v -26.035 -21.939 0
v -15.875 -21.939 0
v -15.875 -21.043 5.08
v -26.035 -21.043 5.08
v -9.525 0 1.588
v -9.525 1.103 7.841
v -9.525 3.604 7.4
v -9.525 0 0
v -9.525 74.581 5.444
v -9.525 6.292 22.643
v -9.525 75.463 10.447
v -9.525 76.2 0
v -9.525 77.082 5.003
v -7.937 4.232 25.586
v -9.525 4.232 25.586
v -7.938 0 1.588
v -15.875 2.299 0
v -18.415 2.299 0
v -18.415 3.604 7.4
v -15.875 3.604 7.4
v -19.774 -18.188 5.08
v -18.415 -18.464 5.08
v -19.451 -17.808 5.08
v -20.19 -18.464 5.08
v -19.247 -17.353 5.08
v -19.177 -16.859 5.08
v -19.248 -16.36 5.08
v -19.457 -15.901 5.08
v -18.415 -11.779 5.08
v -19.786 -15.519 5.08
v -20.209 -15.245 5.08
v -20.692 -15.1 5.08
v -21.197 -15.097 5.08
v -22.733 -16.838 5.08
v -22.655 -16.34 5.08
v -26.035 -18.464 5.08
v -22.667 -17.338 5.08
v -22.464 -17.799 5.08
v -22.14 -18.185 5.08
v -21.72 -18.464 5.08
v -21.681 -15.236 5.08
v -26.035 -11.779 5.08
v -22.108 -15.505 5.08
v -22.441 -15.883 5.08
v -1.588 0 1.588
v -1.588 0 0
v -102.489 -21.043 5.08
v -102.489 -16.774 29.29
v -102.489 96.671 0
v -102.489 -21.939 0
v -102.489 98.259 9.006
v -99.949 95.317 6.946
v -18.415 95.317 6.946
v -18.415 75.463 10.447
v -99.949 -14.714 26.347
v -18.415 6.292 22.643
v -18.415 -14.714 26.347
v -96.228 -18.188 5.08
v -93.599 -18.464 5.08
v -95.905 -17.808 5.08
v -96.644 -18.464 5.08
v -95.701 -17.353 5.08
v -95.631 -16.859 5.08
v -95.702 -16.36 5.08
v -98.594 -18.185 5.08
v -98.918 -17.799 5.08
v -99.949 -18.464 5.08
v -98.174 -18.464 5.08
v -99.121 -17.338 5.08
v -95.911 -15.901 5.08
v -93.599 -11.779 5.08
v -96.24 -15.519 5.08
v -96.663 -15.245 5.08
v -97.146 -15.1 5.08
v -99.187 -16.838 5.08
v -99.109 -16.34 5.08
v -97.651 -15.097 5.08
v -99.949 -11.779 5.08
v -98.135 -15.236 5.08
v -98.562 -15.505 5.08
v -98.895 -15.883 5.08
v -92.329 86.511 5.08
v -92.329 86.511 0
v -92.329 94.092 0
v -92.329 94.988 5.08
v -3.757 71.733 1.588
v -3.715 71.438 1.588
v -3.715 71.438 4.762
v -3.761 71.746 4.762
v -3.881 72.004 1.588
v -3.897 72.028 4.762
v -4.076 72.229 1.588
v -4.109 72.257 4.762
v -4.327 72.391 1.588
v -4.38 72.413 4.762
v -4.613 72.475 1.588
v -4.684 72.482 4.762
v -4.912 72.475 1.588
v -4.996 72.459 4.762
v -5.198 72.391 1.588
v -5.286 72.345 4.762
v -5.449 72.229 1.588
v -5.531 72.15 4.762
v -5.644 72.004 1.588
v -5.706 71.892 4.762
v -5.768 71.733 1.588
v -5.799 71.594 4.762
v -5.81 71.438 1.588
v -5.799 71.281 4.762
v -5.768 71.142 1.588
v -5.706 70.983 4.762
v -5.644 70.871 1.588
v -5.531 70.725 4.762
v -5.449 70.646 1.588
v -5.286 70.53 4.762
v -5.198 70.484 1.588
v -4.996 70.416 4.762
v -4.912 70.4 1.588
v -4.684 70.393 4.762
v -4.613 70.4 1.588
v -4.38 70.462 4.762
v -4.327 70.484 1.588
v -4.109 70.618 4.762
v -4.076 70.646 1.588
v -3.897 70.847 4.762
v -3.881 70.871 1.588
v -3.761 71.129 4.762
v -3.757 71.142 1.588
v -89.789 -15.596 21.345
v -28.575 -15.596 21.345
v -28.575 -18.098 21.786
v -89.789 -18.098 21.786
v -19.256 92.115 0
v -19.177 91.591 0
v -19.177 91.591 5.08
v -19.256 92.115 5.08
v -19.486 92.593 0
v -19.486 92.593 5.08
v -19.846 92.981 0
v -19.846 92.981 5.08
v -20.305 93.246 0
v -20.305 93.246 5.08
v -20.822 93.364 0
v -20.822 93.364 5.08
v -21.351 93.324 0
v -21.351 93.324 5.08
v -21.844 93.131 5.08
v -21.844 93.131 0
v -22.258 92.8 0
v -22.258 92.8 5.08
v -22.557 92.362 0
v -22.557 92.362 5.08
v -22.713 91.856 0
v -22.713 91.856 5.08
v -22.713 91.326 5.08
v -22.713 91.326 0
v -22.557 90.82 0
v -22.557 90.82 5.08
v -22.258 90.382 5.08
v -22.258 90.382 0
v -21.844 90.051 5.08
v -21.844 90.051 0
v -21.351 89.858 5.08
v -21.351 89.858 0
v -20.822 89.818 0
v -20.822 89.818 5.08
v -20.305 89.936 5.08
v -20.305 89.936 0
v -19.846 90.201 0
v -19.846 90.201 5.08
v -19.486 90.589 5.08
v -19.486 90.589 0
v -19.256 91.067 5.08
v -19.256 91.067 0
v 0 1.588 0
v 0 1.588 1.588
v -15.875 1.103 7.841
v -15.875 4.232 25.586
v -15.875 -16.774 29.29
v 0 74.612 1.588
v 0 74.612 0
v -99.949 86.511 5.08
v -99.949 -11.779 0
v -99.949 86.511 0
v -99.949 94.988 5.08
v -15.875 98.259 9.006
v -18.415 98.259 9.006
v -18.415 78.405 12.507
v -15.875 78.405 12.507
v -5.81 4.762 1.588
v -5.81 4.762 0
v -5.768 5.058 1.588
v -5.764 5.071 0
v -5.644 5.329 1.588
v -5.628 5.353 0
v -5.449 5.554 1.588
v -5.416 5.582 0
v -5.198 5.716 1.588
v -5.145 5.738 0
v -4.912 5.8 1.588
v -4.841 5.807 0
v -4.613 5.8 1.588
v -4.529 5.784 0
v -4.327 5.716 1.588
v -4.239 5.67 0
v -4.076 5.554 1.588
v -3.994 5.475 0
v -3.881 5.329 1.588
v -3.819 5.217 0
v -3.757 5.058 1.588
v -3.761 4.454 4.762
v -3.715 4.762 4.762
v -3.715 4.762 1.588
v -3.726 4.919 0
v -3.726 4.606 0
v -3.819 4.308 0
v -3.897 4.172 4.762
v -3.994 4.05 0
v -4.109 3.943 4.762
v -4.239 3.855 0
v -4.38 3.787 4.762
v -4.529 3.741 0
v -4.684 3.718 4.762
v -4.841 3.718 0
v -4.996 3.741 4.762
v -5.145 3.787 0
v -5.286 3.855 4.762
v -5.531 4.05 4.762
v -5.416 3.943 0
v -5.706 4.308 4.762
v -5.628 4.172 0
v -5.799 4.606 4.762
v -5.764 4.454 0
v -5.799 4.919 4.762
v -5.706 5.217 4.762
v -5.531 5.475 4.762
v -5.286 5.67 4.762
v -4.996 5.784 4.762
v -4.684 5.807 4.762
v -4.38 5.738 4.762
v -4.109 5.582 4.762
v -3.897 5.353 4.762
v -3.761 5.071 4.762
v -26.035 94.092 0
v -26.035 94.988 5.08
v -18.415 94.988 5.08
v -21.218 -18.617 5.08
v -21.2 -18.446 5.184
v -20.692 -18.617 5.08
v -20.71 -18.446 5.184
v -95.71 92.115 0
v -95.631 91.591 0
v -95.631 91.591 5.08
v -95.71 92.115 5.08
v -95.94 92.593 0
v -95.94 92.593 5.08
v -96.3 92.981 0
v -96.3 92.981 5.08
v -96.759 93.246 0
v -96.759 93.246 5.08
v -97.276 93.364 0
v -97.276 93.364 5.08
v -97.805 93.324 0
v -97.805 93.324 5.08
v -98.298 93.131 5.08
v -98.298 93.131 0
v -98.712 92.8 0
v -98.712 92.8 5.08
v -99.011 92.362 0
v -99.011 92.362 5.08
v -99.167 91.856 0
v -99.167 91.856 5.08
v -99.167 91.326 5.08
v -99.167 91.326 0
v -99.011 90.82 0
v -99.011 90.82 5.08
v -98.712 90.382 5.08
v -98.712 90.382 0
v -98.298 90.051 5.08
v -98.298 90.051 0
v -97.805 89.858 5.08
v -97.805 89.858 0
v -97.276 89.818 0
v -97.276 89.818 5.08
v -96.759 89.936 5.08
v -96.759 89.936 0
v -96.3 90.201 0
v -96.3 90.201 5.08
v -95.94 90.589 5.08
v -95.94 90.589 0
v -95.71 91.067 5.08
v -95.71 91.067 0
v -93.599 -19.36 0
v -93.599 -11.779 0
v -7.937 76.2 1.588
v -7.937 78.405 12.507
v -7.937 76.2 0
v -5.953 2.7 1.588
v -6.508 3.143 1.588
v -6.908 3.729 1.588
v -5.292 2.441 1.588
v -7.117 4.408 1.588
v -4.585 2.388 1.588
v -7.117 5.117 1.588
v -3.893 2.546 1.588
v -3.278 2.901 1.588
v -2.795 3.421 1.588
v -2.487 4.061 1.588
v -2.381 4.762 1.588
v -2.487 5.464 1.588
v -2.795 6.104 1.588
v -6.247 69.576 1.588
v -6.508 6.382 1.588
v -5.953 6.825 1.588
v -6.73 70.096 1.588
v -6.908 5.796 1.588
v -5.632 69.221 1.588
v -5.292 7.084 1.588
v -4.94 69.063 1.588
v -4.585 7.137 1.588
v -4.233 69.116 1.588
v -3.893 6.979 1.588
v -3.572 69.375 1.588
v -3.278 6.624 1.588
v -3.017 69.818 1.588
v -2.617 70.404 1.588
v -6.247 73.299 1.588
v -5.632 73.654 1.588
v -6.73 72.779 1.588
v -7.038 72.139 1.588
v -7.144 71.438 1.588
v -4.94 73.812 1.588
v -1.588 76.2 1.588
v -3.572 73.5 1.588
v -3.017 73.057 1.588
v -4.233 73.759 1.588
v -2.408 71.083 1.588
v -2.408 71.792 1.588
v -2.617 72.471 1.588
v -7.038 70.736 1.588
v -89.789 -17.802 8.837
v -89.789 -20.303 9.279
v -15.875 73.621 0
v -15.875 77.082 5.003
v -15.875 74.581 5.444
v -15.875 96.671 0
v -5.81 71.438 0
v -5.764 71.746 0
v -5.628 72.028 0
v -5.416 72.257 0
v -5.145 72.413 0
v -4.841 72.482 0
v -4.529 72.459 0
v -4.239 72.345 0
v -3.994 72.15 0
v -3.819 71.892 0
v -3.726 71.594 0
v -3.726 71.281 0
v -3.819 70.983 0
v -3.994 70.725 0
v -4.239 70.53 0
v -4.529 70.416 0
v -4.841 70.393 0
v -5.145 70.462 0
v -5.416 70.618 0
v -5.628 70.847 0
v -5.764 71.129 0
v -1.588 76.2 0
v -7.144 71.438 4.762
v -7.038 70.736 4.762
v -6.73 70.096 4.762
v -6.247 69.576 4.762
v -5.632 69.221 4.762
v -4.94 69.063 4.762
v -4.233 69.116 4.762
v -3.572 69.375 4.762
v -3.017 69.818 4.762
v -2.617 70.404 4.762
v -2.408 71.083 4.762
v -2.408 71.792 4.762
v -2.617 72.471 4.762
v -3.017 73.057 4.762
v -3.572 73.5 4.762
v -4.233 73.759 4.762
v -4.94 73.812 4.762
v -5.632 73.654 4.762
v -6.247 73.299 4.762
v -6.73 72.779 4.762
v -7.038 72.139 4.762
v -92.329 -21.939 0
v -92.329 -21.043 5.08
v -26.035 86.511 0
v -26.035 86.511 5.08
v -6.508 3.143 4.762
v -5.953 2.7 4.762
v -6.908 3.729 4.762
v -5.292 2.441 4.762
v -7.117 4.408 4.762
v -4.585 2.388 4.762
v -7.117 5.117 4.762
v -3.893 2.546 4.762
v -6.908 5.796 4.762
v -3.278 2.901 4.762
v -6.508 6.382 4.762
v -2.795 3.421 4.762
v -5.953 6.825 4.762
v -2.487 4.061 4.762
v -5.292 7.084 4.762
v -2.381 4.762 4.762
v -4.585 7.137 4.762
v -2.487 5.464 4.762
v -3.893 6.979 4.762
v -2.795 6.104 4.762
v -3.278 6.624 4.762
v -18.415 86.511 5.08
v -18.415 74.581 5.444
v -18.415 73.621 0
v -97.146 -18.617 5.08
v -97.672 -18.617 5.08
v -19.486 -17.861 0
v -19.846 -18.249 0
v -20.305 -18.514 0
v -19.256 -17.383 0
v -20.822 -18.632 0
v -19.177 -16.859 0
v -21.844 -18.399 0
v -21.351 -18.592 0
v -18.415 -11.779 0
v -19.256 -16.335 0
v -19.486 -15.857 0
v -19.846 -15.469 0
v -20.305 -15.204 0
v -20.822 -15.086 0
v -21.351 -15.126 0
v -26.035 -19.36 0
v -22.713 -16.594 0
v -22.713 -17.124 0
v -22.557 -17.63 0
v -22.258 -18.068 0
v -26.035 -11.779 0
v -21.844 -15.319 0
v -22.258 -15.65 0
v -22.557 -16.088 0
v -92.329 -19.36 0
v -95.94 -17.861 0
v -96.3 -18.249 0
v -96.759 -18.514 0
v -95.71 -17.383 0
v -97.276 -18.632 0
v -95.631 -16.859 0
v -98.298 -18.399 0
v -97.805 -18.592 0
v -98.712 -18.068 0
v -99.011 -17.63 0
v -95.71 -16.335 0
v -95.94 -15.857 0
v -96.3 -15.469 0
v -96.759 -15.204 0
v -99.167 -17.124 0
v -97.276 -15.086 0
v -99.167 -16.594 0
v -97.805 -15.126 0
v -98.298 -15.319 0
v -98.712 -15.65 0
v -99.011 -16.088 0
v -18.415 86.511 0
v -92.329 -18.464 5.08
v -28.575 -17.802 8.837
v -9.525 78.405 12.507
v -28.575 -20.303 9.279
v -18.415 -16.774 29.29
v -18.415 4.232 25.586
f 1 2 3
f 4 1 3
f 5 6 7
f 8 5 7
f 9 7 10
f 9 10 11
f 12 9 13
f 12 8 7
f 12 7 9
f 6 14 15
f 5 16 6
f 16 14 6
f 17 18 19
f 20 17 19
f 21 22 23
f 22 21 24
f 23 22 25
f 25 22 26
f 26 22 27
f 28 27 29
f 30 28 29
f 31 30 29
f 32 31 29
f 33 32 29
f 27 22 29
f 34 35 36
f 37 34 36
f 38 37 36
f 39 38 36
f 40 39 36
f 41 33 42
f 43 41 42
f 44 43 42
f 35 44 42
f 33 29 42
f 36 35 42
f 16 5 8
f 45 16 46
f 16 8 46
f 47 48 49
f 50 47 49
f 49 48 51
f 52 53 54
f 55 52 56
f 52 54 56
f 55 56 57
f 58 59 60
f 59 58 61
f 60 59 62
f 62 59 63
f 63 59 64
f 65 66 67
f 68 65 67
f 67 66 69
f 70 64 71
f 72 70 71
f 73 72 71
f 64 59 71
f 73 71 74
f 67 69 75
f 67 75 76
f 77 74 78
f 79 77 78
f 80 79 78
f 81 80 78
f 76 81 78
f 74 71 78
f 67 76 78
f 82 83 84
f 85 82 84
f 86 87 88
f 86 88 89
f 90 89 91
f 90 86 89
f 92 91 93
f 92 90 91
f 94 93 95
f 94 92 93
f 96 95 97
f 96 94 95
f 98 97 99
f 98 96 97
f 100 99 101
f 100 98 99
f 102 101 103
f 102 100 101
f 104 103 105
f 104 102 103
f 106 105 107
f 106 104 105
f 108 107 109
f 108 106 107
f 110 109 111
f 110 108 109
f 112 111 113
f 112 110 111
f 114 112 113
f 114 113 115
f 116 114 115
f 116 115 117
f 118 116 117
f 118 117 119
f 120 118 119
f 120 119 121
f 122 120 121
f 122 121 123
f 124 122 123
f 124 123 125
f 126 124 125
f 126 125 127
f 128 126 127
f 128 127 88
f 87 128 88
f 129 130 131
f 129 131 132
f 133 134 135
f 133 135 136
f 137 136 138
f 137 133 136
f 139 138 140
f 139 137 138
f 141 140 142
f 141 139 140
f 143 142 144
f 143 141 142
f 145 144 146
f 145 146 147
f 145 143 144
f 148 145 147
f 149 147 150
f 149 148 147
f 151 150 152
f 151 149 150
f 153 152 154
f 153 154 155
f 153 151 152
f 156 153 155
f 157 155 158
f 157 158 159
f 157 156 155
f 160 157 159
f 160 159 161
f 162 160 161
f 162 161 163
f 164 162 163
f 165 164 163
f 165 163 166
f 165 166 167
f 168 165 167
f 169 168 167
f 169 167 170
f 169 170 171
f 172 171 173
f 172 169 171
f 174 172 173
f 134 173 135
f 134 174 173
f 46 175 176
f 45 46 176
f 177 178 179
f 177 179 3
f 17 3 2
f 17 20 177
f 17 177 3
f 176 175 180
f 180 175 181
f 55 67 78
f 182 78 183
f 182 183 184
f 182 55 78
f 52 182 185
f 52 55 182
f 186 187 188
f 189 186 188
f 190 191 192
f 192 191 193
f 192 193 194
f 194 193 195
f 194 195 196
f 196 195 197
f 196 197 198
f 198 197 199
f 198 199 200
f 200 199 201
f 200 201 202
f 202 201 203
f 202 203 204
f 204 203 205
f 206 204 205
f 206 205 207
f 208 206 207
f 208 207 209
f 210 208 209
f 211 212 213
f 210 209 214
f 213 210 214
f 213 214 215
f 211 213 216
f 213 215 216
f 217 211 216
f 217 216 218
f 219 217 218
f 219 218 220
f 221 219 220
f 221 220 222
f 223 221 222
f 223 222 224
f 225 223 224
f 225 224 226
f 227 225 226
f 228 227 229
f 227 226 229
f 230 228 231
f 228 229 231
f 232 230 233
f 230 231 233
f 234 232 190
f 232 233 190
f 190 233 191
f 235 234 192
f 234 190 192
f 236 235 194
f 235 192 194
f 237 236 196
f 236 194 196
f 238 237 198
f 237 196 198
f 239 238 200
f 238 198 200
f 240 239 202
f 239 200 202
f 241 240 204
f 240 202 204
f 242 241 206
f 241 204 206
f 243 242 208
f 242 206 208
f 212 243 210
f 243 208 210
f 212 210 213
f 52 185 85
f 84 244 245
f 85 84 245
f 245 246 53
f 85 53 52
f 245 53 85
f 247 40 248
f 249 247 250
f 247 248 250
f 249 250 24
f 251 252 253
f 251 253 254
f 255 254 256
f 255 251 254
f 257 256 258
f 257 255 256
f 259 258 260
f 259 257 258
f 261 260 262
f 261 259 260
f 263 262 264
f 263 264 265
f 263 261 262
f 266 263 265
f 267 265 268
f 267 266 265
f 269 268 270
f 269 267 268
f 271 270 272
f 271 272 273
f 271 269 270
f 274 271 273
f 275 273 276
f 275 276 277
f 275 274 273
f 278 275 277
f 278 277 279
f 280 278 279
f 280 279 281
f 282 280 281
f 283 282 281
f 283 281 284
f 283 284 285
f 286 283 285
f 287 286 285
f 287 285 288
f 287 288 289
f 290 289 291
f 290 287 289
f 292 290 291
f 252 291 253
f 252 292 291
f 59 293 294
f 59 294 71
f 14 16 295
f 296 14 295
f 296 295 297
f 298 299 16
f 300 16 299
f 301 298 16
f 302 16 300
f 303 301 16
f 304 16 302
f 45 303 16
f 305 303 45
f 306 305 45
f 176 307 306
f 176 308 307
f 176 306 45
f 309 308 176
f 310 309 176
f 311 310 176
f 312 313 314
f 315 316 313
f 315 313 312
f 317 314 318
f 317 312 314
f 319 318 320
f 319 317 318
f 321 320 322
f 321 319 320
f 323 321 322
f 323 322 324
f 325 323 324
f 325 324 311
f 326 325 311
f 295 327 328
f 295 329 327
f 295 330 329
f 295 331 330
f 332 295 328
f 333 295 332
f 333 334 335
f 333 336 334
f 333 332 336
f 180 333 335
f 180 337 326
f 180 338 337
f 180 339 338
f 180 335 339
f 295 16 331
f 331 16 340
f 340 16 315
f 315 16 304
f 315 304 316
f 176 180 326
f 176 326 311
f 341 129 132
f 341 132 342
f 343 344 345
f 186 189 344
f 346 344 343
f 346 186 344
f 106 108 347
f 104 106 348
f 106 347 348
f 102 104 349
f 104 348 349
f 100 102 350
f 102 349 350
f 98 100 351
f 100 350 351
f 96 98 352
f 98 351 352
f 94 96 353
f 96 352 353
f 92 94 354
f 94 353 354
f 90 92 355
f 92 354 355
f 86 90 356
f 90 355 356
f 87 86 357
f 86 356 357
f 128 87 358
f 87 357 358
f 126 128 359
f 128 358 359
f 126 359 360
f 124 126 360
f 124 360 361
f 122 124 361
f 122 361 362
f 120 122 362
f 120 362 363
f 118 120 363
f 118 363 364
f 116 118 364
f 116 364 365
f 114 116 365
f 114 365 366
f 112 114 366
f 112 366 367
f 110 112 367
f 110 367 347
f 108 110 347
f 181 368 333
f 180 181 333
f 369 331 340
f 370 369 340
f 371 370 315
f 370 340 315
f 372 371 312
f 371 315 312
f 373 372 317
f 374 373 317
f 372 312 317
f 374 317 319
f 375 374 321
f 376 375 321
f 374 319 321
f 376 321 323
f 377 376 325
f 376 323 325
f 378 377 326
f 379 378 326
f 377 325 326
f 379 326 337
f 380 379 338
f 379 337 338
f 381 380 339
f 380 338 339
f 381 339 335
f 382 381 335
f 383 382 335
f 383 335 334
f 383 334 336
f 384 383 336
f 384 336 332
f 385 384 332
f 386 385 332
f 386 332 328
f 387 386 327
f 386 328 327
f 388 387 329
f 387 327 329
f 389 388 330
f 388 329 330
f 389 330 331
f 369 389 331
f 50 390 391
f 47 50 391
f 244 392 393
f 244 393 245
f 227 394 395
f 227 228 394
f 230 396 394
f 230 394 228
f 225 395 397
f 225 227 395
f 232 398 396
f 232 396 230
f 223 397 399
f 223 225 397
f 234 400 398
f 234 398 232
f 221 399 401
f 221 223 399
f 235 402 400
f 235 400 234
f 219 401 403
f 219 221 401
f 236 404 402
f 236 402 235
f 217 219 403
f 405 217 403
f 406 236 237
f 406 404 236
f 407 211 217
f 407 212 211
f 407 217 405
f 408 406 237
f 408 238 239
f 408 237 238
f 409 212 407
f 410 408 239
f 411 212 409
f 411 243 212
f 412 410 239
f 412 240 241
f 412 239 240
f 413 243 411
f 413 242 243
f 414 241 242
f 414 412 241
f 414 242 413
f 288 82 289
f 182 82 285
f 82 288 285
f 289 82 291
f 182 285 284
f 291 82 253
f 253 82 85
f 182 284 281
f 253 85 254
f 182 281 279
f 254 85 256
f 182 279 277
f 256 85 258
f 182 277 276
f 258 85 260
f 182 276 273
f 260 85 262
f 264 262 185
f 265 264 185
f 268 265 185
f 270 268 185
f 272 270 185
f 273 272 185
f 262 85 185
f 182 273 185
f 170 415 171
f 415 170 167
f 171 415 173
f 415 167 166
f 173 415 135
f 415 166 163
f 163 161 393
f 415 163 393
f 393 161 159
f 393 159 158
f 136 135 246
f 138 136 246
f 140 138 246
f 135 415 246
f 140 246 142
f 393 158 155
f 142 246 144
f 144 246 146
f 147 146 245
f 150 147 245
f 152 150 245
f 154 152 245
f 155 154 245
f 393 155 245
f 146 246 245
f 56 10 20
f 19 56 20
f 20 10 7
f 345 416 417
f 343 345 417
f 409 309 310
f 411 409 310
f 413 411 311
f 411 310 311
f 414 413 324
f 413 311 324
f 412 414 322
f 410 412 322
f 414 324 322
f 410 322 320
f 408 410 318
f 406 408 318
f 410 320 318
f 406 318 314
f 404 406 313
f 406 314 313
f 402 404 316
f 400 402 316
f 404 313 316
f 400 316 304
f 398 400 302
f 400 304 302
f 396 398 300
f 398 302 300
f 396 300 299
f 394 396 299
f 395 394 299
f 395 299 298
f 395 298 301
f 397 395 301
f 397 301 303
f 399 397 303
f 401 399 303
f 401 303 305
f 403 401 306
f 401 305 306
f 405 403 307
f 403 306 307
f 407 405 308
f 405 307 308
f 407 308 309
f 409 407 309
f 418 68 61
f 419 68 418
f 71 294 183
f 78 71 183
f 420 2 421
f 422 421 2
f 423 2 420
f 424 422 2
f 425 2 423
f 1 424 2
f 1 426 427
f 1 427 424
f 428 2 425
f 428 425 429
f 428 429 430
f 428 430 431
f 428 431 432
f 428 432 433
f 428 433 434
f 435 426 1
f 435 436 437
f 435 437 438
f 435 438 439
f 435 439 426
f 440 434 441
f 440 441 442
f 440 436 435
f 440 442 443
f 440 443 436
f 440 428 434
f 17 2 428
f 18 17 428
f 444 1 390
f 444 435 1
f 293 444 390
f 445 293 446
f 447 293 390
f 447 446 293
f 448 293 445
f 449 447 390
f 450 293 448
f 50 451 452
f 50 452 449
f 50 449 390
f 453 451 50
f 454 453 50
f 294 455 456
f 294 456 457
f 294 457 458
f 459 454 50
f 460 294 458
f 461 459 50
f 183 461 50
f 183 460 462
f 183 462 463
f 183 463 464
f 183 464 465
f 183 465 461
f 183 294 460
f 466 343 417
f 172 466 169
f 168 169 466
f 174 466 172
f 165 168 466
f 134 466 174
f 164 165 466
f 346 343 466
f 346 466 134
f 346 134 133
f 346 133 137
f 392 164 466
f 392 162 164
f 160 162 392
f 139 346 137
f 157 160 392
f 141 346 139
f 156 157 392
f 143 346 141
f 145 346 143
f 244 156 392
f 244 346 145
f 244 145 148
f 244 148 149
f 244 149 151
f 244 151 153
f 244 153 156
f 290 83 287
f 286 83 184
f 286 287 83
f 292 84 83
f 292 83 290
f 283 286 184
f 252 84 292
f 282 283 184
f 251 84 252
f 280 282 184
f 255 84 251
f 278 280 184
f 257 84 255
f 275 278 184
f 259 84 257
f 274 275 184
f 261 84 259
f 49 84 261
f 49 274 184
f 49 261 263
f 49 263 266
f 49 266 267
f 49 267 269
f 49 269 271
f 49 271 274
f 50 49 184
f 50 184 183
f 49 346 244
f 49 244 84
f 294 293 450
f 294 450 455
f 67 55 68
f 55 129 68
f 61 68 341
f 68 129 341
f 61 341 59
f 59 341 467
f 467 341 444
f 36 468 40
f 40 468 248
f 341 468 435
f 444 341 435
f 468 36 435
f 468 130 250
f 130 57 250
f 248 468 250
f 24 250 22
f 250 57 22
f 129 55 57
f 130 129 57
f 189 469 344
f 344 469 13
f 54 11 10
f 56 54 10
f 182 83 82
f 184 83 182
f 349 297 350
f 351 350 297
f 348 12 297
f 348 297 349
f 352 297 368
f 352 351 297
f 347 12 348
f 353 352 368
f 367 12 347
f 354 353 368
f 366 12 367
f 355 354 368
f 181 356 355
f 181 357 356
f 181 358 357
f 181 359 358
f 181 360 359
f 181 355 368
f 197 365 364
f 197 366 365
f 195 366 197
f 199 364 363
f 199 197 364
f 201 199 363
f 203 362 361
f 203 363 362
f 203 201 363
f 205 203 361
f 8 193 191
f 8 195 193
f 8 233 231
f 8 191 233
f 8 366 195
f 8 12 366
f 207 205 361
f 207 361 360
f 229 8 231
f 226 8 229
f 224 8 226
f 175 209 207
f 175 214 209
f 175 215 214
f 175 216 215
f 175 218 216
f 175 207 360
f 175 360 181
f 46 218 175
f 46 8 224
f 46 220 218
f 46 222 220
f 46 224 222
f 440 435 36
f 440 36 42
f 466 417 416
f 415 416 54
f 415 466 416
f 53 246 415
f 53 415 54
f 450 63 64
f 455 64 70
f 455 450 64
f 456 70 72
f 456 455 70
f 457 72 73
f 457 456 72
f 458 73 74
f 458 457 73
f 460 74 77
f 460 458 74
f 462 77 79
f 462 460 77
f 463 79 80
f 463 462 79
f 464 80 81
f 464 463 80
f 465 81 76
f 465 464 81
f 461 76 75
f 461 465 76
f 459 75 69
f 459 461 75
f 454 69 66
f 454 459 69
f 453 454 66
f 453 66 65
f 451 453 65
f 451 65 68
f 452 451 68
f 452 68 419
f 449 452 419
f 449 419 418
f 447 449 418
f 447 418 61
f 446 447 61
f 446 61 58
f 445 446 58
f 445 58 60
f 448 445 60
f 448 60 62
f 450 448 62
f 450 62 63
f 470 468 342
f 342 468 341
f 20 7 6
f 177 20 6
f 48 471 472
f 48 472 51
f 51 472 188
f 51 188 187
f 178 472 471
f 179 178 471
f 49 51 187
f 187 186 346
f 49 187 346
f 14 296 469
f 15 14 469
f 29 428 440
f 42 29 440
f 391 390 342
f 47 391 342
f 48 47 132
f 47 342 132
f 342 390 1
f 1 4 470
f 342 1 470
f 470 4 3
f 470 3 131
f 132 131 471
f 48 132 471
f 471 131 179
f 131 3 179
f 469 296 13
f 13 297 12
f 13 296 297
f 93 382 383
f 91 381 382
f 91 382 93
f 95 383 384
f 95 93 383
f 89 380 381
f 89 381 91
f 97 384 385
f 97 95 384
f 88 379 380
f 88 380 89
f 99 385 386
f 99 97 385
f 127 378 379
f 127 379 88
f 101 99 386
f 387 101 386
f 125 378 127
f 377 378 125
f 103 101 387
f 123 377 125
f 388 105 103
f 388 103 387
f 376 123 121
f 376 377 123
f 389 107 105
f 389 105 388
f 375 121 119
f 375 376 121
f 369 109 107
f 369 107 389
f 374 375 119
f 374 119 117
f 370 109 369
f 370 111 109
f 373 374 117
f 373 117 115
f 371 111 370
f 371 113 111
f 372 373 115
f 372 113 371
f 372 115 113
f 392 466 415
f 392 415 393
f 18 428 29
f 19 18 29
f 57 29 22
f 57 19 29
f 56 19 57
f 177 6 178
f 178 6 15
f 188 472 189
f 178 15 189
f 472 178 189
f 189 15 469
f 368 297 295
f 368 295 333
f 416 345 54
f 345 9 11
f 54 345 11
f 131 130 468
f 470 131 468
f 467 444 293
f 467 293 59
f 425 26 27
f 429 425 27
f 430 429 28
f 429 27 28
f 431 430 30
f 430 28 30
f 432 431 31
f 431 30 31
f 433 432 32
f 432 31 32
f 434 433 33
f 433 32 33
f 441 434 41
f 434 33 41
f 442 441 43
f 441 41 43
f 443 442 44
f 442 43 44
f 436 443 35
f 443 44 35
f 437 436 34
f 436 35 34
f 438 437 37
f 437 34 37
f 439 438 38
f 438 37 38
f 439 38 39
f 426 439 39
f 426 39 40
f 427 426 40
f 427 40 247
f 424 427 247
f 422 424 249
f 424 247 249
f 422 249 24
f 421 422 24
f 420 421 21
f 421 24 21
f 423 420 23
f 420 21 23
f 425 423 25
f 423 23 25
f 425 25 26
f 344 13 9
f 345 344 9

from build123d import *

# Parameters (mm, degrees)
SKETCH1_W                          = 9.525
SKETCH1_H                          = 76.2
BOSS_EXTRUDE1_DEPTH                = 1.5875
CHAMFER2_SIZE                      = 1.5875
F_97_0_0825_DIAMETER_HOLE1_D       = 2.0955
SKETCH5_R                          = 2.38125
SKETCH5_R_2                        = 1.04775
BOSS_EXTRUDE2_DEPTH                = 3.175
BOSS_EXTRUDE4_REACH                = 77.644
SKETCH7_W                          = 1.5875
SKETCH7_H                          = 75.318017262
BOSS_EXTRUDE4_DIRECTION_2_DEPTH    = 12.7
CUT_EXTRUDE1_DEPTH                 = 83.855524788
BOSS_EXTRUDE5_DEPTH                = 8.89
BOSS_EXTRUDE7_DEPTH                = 2.54
BOSS_EXTRUDE11_DEPTH               = 2.54
BOSS_EXTRUDE8_DEPTH                = 84.074
BOSS_EXTRUDE12_REACH               = 143.095
SKETCH18_W                         = 2.54
SKETCH18_H                         = 111.72801717
CUT_EXTRUDE2_DEPTH                 = 160.515381323
CUT_EXTRUDE2_DEPTH_BACK            = 2.54
SKETCH19_W                         = 61.214
SKETCH19_H                         = 12.7
SKETCH20_W                         = 10.16
SKETCH20_H                         = 10.16
BOSS_EXTRUDE13_DEPTH               = 5.08
CUT_EXTRUDE3_DEPTH                 = 128.89819871
CUT_EXTRUDE3_DEPTH_BACK            = 128.89819871
F_97_0_14_DIAMETER_HOLE1_OUTLINE_R = 1.778
F_97_0_14_DIAMETER_HOLE1_DEPTH     = 5.08
CUT_EXTRUDE4_DEPTH                 = 1.27


# Read off the part's stored shape, not the designer's step: #97 (0.14) Diameter Hole1
with BuildPart() as part:
    # Sketch1 → Boss-Extrude1 (new body)
    with BuildSketch(Plane.XY):
        with Locations((-4.7625, 38.1)):
            Rectangle(SKETCH1_W, SKETCH1_H)
    extrude(amount=BOSS_EXTRUDE1_DEPTH)

    # Chamfer2
    chamfer2_edges = [part.edges().sort_by_distance(p)[0] for p in [
        (0, 0, 0.79375),
        (-9.525, 0, 0.79375),
        (-9.525, 76.2, 0.79375),
        (0, 76.2, 0.79375),
    ]]
    chamfer(chamfer2_edges, length=CHAMFER2_SIZE)

    # #97 (0.0825) Diameter Hole1 (through all)
    with Locations(Plane.XY.offset(1.5875)):
        with Locations((-4.7625, 4.7625), (-4.7625, 71.4375)):
            Hole(F_97_0_0825_DIAMETER_HOLE1_D / 2)

    # Sketch5 → Boss-Extrude2 (add)
    # profile 1 of 2: a face of its own
    with BuildSketch(Plane.XY.offset(1.5875)):
        with Locations((-4.7625, 4.7625)):
            Circle(SKETCH5_R)
        with Locations((-4.7625, 4.7625)):
            Circle(SKETCH5_R_2, mode=Mode.SUBTRACT)
    # profile 2 of 2: a face of its own
    with BuildSketch(Plane.XY.offset(1.5875)):
        with Locations(Location((-4.7625, 71.4375, 0), (0, 0, 180))):
            Circle(SKETCH5_R)
        with Locations((-4.7625, 71.4375)):
            Circle(SKETCH5_R_2, mode=Mode.SUBTRACT)
    extrude(amount=BOSS_EXTRUDE2_DEPTH)

    # Boss-Extrude4: up to this face of the body (flat: up to its plane)
    boss_extrude4_end = Plane(part.part.faces().sort_by_distance((-4.7625, 38.1, 0))[0])
    # Sketch7 → Boss-Extrude4 (add, up to the picked face)
    with BuildSketch(Plane(origin=(0, 2.297711148, 13.030967461), x_dir=(-1, 0, 0), z_dir=(0, -0.1736481776669307, -0.984807753012208)), mode=Mode.PRIVATE) as boss_extrude4_sk1:
        with Locations((8.73125, 37.383342149)):
            Rectangle(SKETCH7_W, SKETCH7_H)
    boss_extrude4_tool1 = split(extrude(boss_extrude4_sk1.sketch, amount=BOSS_EXTRUDE4_REACH, mode=Mode.PRIVATE), bisect_by=boss_extrude4_end, keep=Keep.BOTH, mode=Mode.PRIVATE)
    add(boss_extrude4_tool1.solids().sort_by(Axis((-8.73125, 39.113116, 6.539418), (0, -0.1736481776669307, -0.984807753012208)))[0])

    # Sketch7 → Boss-Extrude4 direction 2 (add)
    with BuildSketch(Plane(origin=(0, 2.297711148, 13.030967461), x_dir=(-1, 0, 0), z_dir=(0, -0.1736481776669307, -0.984807753012208))):
        with Locations((8.73125, 37.383342149)):
            Rectangle(SKETCH7_W, SKETCH7_H)
    extrude(amount=-BOSS_EXTRUDE4_DIRECTION_2_DEPTH)

    # Sketch9 → Cut-Extrude1 (cut, through all)
    with BuildSketch(Plane(origin=(-7.9375, 0, 0), x_dir=(0, 0, -1), z_dir=(1, 0, 0))):
        Polygon((0, 0), (-1.5875, 0), (0, -0.279919082), align=None)
    extrude(amount=-CUT_EXTRUDE1_DEPTH, mode=Mode.SUBTRACT)

    # Sketch10 → Boss-Extrude5 (add)
    with BuildSketch(Plane.ZY.offset(9.525)):
        Polygon((25.585894906, 4.231564516), (12.507058463, 78.405331856), (5.002823385, 77.082132743), (5.443889757, 74.58072105), (10.446713142, 75.462853792), (22.643416842, 6.291909837), (7.39996286, 3.604077621), (7.841029232, 1.102665928), align=None)
    extrude(amount=BOSS_EXTRUDE5_DEPTH)

    # Sketch12 → Boss-Extrude7 (add)
    with BuildSketch(Plane.ZY.offset(18.415)):
        Polygon((25.144828535, 6.732976208), (29.28981052, -16.774384765), (0, -21.93896862), (0, 2.299264512), align=None)
    extrude(amount=-BOSS_EXTRUDE7_DEPTH)

    # Sketch17 → Boss-Extrude11 (add)
    with BuildSketch(Plane.ZY.offset(18.415)):
        Polygon((12.948124835, 75.903920164), (0, 73.620816406), (0, 96.671000496), (9.006311201, 98.259056157), align=None)
    extrude(amount=-BOSS_EXTRUDE11_DEPTH)

    # Sketch13 → Boss-Extrude8 (add)
    with BuildSketch(Plane.ZY.offset(18.415)):
        Polygon((9.006311201, 98.259056157), (0, 96.671000496), (0, 94.091816901), (6.94596588, 95.316578093), (26.347332456, -14.714039444), (0, -19.359785026), (0, -21.93896862), (29.28981052, -16.774384765), align=None)
    extrude(amount=BOSS_EXTRUDE8_DEPTH)

    # Boss-Extrude12: up to this plane
    boss_extrude12_end = Plane(origin=(-15.875, 2.299264512, 0), z_dir=(0, 0, -1))
    # Sketch18 → Boss-Extrude12 (add, up to the surface)
    with BuildSketch(Plane(origin=(0, 4.061976633, 23.036614231), x_dir=(-1, 0, 0), z_dir=(0, -0.17364817766693072, -0.9848077530122081)), mode=Mode.PRIVATE) as boss_extrude12_sk1:
        with Locations((101.219, 36.798342195)):
            Rectangle(SKETCH18_W, SKETCH18_H)
    boss_extrude12_tool1 = split(extrude(boss_extrude12_sk1.sketch, amount=BOSS_EXTRUDE12_REACH, mode=Mode.PRIVATE), bisect_by=boss_extrude12_end, keep=Keep.BOTH, mode=Mode.PRIVATE)
    add(boss_extrude12_tool1.solids().sort_by_distance((-101.219, 40.301269, 16.646649))[0])

    # Sketch19 → Cut-Extrude2 (cut, two sides: drawn at the far end of the back side and taken through both)
    with BuildSketch(Plane(origin=(0, -21.27742777, 3.751784596), x_dir=(-1, 0, 0), z_dir=(0, -0.984807753012208, 0.17364817766693108)).offset(-CUT_EXTRUDE2_DEPTH_BACK)):
        with Locations((59.182, -11.961991138)):
            Rectangle(SKETCH19_W, SKETCH19_H)
    extrude(amount=CUT_EXTRUDE2_DEPTH + CUT_EXTRUDE2_DEPTH_BACK, mode=Mode.SUBTRACT)

    # Sketch20 → Boss-Extrude13 (add)
    with BuildSketch(Plane(origin=(0, 0, 0), x_dir=(-1, 0, 0), z_dir=(0, 0, -1))):
        with Locations((97.409, -16.85896862)):
            Rectangle(SKETCH20_W, SKETCH20_H)
        with Locations((20.955, -16.85896862)):
            Rectangle(SKETCH20_W, SKETCH20_H)
        with Locations((20.955, 91.591000496)):
            Rectangle(SKETCH20_W, SKETCH20_H)
        with Locations((97.409, 91.591000496)):
            Rectangle(SKETCH20_W, SKETCH20_H)
    extrude(amount=-BOSS_EXTRUDE13_DEPTH)

    # Sketch21 → Cut-Extrude3 (cut, two sides: drawn at the far end of the back side and taken through both)
    with BuildSketch(Plane.ZY.offset(26.035).offset(-CUT_EXTRUDE3_DEPTH_BACK)):
        Polygon((0, -21.93896862), (5.08, -21.043227558), (5.08, -21.93896862), align=None)
    extrude(amount=CUT_EXTRUDE3_DEPTH + CUT_EXTRUDE3_DEPTH_BACK, mode=Mode.SUBTRACT)

    # #97 (0.14) Diameter Hole1 outline → #97 (0.14) Diameter Hole1 (cut)
    with BuildSketch(Plane.XY):
        with Locations((-97.409, 91.591000496)):
            Circle(F_97_0_14_DIAMETER_HOLE1_OUTLINE_R)
        with Locations((-20.955, 91.591000496)):
            Circle(F_97_0_14_DIAMETER_HOLE1_OUTLINE_R)
        with Locations((-97.409, -16.85896862)):
            Circle(F_97_0_14_DIAMETER_HOLE1_OUTLINE_R)
    extrude(amount=F_97_0_14_DIAMETER_HOLE1_DEPTH, mode=Mode.SUBTRACT)

    # 97 _0.14_ Diameter Hole1 2 outline → 97 _0.14_ Diameter Hole1 2 (revolve, cut)
    with BuildSketch(Plane(origin=(-20.955, -16.85896862, 0), x_dir=(1, 0, 0), z_dir=(0, -1, 0))):
        Polygon((0, 0), (1.778000002, 0), (1.778, 5.08), (1.584438765, 5.196303323), (0, 5.196303323), align=None)
    revolve(axis=Axis((-20.955, -16.85896862, 0), (0, 0, 1)), mode=Mode.SUBTRACT)

    # Sketch24 → Cut-Extrude4 (cut)
    with BuildSketch(Plane(origin=(-92.329, 0, 0), x_dir=(0, 0, -1), z_dir=(1, 0, 0))):
        Polygon((0, -19.359785026), (-5.08, -18.464043964), (-5.08, -11.77896862), (0, -11.77896862), align=None)
    extrude(amount=-CUT_EXTRUDE4_DEPTH, mode=Mode.SUBTRACT)


solid = part.part
